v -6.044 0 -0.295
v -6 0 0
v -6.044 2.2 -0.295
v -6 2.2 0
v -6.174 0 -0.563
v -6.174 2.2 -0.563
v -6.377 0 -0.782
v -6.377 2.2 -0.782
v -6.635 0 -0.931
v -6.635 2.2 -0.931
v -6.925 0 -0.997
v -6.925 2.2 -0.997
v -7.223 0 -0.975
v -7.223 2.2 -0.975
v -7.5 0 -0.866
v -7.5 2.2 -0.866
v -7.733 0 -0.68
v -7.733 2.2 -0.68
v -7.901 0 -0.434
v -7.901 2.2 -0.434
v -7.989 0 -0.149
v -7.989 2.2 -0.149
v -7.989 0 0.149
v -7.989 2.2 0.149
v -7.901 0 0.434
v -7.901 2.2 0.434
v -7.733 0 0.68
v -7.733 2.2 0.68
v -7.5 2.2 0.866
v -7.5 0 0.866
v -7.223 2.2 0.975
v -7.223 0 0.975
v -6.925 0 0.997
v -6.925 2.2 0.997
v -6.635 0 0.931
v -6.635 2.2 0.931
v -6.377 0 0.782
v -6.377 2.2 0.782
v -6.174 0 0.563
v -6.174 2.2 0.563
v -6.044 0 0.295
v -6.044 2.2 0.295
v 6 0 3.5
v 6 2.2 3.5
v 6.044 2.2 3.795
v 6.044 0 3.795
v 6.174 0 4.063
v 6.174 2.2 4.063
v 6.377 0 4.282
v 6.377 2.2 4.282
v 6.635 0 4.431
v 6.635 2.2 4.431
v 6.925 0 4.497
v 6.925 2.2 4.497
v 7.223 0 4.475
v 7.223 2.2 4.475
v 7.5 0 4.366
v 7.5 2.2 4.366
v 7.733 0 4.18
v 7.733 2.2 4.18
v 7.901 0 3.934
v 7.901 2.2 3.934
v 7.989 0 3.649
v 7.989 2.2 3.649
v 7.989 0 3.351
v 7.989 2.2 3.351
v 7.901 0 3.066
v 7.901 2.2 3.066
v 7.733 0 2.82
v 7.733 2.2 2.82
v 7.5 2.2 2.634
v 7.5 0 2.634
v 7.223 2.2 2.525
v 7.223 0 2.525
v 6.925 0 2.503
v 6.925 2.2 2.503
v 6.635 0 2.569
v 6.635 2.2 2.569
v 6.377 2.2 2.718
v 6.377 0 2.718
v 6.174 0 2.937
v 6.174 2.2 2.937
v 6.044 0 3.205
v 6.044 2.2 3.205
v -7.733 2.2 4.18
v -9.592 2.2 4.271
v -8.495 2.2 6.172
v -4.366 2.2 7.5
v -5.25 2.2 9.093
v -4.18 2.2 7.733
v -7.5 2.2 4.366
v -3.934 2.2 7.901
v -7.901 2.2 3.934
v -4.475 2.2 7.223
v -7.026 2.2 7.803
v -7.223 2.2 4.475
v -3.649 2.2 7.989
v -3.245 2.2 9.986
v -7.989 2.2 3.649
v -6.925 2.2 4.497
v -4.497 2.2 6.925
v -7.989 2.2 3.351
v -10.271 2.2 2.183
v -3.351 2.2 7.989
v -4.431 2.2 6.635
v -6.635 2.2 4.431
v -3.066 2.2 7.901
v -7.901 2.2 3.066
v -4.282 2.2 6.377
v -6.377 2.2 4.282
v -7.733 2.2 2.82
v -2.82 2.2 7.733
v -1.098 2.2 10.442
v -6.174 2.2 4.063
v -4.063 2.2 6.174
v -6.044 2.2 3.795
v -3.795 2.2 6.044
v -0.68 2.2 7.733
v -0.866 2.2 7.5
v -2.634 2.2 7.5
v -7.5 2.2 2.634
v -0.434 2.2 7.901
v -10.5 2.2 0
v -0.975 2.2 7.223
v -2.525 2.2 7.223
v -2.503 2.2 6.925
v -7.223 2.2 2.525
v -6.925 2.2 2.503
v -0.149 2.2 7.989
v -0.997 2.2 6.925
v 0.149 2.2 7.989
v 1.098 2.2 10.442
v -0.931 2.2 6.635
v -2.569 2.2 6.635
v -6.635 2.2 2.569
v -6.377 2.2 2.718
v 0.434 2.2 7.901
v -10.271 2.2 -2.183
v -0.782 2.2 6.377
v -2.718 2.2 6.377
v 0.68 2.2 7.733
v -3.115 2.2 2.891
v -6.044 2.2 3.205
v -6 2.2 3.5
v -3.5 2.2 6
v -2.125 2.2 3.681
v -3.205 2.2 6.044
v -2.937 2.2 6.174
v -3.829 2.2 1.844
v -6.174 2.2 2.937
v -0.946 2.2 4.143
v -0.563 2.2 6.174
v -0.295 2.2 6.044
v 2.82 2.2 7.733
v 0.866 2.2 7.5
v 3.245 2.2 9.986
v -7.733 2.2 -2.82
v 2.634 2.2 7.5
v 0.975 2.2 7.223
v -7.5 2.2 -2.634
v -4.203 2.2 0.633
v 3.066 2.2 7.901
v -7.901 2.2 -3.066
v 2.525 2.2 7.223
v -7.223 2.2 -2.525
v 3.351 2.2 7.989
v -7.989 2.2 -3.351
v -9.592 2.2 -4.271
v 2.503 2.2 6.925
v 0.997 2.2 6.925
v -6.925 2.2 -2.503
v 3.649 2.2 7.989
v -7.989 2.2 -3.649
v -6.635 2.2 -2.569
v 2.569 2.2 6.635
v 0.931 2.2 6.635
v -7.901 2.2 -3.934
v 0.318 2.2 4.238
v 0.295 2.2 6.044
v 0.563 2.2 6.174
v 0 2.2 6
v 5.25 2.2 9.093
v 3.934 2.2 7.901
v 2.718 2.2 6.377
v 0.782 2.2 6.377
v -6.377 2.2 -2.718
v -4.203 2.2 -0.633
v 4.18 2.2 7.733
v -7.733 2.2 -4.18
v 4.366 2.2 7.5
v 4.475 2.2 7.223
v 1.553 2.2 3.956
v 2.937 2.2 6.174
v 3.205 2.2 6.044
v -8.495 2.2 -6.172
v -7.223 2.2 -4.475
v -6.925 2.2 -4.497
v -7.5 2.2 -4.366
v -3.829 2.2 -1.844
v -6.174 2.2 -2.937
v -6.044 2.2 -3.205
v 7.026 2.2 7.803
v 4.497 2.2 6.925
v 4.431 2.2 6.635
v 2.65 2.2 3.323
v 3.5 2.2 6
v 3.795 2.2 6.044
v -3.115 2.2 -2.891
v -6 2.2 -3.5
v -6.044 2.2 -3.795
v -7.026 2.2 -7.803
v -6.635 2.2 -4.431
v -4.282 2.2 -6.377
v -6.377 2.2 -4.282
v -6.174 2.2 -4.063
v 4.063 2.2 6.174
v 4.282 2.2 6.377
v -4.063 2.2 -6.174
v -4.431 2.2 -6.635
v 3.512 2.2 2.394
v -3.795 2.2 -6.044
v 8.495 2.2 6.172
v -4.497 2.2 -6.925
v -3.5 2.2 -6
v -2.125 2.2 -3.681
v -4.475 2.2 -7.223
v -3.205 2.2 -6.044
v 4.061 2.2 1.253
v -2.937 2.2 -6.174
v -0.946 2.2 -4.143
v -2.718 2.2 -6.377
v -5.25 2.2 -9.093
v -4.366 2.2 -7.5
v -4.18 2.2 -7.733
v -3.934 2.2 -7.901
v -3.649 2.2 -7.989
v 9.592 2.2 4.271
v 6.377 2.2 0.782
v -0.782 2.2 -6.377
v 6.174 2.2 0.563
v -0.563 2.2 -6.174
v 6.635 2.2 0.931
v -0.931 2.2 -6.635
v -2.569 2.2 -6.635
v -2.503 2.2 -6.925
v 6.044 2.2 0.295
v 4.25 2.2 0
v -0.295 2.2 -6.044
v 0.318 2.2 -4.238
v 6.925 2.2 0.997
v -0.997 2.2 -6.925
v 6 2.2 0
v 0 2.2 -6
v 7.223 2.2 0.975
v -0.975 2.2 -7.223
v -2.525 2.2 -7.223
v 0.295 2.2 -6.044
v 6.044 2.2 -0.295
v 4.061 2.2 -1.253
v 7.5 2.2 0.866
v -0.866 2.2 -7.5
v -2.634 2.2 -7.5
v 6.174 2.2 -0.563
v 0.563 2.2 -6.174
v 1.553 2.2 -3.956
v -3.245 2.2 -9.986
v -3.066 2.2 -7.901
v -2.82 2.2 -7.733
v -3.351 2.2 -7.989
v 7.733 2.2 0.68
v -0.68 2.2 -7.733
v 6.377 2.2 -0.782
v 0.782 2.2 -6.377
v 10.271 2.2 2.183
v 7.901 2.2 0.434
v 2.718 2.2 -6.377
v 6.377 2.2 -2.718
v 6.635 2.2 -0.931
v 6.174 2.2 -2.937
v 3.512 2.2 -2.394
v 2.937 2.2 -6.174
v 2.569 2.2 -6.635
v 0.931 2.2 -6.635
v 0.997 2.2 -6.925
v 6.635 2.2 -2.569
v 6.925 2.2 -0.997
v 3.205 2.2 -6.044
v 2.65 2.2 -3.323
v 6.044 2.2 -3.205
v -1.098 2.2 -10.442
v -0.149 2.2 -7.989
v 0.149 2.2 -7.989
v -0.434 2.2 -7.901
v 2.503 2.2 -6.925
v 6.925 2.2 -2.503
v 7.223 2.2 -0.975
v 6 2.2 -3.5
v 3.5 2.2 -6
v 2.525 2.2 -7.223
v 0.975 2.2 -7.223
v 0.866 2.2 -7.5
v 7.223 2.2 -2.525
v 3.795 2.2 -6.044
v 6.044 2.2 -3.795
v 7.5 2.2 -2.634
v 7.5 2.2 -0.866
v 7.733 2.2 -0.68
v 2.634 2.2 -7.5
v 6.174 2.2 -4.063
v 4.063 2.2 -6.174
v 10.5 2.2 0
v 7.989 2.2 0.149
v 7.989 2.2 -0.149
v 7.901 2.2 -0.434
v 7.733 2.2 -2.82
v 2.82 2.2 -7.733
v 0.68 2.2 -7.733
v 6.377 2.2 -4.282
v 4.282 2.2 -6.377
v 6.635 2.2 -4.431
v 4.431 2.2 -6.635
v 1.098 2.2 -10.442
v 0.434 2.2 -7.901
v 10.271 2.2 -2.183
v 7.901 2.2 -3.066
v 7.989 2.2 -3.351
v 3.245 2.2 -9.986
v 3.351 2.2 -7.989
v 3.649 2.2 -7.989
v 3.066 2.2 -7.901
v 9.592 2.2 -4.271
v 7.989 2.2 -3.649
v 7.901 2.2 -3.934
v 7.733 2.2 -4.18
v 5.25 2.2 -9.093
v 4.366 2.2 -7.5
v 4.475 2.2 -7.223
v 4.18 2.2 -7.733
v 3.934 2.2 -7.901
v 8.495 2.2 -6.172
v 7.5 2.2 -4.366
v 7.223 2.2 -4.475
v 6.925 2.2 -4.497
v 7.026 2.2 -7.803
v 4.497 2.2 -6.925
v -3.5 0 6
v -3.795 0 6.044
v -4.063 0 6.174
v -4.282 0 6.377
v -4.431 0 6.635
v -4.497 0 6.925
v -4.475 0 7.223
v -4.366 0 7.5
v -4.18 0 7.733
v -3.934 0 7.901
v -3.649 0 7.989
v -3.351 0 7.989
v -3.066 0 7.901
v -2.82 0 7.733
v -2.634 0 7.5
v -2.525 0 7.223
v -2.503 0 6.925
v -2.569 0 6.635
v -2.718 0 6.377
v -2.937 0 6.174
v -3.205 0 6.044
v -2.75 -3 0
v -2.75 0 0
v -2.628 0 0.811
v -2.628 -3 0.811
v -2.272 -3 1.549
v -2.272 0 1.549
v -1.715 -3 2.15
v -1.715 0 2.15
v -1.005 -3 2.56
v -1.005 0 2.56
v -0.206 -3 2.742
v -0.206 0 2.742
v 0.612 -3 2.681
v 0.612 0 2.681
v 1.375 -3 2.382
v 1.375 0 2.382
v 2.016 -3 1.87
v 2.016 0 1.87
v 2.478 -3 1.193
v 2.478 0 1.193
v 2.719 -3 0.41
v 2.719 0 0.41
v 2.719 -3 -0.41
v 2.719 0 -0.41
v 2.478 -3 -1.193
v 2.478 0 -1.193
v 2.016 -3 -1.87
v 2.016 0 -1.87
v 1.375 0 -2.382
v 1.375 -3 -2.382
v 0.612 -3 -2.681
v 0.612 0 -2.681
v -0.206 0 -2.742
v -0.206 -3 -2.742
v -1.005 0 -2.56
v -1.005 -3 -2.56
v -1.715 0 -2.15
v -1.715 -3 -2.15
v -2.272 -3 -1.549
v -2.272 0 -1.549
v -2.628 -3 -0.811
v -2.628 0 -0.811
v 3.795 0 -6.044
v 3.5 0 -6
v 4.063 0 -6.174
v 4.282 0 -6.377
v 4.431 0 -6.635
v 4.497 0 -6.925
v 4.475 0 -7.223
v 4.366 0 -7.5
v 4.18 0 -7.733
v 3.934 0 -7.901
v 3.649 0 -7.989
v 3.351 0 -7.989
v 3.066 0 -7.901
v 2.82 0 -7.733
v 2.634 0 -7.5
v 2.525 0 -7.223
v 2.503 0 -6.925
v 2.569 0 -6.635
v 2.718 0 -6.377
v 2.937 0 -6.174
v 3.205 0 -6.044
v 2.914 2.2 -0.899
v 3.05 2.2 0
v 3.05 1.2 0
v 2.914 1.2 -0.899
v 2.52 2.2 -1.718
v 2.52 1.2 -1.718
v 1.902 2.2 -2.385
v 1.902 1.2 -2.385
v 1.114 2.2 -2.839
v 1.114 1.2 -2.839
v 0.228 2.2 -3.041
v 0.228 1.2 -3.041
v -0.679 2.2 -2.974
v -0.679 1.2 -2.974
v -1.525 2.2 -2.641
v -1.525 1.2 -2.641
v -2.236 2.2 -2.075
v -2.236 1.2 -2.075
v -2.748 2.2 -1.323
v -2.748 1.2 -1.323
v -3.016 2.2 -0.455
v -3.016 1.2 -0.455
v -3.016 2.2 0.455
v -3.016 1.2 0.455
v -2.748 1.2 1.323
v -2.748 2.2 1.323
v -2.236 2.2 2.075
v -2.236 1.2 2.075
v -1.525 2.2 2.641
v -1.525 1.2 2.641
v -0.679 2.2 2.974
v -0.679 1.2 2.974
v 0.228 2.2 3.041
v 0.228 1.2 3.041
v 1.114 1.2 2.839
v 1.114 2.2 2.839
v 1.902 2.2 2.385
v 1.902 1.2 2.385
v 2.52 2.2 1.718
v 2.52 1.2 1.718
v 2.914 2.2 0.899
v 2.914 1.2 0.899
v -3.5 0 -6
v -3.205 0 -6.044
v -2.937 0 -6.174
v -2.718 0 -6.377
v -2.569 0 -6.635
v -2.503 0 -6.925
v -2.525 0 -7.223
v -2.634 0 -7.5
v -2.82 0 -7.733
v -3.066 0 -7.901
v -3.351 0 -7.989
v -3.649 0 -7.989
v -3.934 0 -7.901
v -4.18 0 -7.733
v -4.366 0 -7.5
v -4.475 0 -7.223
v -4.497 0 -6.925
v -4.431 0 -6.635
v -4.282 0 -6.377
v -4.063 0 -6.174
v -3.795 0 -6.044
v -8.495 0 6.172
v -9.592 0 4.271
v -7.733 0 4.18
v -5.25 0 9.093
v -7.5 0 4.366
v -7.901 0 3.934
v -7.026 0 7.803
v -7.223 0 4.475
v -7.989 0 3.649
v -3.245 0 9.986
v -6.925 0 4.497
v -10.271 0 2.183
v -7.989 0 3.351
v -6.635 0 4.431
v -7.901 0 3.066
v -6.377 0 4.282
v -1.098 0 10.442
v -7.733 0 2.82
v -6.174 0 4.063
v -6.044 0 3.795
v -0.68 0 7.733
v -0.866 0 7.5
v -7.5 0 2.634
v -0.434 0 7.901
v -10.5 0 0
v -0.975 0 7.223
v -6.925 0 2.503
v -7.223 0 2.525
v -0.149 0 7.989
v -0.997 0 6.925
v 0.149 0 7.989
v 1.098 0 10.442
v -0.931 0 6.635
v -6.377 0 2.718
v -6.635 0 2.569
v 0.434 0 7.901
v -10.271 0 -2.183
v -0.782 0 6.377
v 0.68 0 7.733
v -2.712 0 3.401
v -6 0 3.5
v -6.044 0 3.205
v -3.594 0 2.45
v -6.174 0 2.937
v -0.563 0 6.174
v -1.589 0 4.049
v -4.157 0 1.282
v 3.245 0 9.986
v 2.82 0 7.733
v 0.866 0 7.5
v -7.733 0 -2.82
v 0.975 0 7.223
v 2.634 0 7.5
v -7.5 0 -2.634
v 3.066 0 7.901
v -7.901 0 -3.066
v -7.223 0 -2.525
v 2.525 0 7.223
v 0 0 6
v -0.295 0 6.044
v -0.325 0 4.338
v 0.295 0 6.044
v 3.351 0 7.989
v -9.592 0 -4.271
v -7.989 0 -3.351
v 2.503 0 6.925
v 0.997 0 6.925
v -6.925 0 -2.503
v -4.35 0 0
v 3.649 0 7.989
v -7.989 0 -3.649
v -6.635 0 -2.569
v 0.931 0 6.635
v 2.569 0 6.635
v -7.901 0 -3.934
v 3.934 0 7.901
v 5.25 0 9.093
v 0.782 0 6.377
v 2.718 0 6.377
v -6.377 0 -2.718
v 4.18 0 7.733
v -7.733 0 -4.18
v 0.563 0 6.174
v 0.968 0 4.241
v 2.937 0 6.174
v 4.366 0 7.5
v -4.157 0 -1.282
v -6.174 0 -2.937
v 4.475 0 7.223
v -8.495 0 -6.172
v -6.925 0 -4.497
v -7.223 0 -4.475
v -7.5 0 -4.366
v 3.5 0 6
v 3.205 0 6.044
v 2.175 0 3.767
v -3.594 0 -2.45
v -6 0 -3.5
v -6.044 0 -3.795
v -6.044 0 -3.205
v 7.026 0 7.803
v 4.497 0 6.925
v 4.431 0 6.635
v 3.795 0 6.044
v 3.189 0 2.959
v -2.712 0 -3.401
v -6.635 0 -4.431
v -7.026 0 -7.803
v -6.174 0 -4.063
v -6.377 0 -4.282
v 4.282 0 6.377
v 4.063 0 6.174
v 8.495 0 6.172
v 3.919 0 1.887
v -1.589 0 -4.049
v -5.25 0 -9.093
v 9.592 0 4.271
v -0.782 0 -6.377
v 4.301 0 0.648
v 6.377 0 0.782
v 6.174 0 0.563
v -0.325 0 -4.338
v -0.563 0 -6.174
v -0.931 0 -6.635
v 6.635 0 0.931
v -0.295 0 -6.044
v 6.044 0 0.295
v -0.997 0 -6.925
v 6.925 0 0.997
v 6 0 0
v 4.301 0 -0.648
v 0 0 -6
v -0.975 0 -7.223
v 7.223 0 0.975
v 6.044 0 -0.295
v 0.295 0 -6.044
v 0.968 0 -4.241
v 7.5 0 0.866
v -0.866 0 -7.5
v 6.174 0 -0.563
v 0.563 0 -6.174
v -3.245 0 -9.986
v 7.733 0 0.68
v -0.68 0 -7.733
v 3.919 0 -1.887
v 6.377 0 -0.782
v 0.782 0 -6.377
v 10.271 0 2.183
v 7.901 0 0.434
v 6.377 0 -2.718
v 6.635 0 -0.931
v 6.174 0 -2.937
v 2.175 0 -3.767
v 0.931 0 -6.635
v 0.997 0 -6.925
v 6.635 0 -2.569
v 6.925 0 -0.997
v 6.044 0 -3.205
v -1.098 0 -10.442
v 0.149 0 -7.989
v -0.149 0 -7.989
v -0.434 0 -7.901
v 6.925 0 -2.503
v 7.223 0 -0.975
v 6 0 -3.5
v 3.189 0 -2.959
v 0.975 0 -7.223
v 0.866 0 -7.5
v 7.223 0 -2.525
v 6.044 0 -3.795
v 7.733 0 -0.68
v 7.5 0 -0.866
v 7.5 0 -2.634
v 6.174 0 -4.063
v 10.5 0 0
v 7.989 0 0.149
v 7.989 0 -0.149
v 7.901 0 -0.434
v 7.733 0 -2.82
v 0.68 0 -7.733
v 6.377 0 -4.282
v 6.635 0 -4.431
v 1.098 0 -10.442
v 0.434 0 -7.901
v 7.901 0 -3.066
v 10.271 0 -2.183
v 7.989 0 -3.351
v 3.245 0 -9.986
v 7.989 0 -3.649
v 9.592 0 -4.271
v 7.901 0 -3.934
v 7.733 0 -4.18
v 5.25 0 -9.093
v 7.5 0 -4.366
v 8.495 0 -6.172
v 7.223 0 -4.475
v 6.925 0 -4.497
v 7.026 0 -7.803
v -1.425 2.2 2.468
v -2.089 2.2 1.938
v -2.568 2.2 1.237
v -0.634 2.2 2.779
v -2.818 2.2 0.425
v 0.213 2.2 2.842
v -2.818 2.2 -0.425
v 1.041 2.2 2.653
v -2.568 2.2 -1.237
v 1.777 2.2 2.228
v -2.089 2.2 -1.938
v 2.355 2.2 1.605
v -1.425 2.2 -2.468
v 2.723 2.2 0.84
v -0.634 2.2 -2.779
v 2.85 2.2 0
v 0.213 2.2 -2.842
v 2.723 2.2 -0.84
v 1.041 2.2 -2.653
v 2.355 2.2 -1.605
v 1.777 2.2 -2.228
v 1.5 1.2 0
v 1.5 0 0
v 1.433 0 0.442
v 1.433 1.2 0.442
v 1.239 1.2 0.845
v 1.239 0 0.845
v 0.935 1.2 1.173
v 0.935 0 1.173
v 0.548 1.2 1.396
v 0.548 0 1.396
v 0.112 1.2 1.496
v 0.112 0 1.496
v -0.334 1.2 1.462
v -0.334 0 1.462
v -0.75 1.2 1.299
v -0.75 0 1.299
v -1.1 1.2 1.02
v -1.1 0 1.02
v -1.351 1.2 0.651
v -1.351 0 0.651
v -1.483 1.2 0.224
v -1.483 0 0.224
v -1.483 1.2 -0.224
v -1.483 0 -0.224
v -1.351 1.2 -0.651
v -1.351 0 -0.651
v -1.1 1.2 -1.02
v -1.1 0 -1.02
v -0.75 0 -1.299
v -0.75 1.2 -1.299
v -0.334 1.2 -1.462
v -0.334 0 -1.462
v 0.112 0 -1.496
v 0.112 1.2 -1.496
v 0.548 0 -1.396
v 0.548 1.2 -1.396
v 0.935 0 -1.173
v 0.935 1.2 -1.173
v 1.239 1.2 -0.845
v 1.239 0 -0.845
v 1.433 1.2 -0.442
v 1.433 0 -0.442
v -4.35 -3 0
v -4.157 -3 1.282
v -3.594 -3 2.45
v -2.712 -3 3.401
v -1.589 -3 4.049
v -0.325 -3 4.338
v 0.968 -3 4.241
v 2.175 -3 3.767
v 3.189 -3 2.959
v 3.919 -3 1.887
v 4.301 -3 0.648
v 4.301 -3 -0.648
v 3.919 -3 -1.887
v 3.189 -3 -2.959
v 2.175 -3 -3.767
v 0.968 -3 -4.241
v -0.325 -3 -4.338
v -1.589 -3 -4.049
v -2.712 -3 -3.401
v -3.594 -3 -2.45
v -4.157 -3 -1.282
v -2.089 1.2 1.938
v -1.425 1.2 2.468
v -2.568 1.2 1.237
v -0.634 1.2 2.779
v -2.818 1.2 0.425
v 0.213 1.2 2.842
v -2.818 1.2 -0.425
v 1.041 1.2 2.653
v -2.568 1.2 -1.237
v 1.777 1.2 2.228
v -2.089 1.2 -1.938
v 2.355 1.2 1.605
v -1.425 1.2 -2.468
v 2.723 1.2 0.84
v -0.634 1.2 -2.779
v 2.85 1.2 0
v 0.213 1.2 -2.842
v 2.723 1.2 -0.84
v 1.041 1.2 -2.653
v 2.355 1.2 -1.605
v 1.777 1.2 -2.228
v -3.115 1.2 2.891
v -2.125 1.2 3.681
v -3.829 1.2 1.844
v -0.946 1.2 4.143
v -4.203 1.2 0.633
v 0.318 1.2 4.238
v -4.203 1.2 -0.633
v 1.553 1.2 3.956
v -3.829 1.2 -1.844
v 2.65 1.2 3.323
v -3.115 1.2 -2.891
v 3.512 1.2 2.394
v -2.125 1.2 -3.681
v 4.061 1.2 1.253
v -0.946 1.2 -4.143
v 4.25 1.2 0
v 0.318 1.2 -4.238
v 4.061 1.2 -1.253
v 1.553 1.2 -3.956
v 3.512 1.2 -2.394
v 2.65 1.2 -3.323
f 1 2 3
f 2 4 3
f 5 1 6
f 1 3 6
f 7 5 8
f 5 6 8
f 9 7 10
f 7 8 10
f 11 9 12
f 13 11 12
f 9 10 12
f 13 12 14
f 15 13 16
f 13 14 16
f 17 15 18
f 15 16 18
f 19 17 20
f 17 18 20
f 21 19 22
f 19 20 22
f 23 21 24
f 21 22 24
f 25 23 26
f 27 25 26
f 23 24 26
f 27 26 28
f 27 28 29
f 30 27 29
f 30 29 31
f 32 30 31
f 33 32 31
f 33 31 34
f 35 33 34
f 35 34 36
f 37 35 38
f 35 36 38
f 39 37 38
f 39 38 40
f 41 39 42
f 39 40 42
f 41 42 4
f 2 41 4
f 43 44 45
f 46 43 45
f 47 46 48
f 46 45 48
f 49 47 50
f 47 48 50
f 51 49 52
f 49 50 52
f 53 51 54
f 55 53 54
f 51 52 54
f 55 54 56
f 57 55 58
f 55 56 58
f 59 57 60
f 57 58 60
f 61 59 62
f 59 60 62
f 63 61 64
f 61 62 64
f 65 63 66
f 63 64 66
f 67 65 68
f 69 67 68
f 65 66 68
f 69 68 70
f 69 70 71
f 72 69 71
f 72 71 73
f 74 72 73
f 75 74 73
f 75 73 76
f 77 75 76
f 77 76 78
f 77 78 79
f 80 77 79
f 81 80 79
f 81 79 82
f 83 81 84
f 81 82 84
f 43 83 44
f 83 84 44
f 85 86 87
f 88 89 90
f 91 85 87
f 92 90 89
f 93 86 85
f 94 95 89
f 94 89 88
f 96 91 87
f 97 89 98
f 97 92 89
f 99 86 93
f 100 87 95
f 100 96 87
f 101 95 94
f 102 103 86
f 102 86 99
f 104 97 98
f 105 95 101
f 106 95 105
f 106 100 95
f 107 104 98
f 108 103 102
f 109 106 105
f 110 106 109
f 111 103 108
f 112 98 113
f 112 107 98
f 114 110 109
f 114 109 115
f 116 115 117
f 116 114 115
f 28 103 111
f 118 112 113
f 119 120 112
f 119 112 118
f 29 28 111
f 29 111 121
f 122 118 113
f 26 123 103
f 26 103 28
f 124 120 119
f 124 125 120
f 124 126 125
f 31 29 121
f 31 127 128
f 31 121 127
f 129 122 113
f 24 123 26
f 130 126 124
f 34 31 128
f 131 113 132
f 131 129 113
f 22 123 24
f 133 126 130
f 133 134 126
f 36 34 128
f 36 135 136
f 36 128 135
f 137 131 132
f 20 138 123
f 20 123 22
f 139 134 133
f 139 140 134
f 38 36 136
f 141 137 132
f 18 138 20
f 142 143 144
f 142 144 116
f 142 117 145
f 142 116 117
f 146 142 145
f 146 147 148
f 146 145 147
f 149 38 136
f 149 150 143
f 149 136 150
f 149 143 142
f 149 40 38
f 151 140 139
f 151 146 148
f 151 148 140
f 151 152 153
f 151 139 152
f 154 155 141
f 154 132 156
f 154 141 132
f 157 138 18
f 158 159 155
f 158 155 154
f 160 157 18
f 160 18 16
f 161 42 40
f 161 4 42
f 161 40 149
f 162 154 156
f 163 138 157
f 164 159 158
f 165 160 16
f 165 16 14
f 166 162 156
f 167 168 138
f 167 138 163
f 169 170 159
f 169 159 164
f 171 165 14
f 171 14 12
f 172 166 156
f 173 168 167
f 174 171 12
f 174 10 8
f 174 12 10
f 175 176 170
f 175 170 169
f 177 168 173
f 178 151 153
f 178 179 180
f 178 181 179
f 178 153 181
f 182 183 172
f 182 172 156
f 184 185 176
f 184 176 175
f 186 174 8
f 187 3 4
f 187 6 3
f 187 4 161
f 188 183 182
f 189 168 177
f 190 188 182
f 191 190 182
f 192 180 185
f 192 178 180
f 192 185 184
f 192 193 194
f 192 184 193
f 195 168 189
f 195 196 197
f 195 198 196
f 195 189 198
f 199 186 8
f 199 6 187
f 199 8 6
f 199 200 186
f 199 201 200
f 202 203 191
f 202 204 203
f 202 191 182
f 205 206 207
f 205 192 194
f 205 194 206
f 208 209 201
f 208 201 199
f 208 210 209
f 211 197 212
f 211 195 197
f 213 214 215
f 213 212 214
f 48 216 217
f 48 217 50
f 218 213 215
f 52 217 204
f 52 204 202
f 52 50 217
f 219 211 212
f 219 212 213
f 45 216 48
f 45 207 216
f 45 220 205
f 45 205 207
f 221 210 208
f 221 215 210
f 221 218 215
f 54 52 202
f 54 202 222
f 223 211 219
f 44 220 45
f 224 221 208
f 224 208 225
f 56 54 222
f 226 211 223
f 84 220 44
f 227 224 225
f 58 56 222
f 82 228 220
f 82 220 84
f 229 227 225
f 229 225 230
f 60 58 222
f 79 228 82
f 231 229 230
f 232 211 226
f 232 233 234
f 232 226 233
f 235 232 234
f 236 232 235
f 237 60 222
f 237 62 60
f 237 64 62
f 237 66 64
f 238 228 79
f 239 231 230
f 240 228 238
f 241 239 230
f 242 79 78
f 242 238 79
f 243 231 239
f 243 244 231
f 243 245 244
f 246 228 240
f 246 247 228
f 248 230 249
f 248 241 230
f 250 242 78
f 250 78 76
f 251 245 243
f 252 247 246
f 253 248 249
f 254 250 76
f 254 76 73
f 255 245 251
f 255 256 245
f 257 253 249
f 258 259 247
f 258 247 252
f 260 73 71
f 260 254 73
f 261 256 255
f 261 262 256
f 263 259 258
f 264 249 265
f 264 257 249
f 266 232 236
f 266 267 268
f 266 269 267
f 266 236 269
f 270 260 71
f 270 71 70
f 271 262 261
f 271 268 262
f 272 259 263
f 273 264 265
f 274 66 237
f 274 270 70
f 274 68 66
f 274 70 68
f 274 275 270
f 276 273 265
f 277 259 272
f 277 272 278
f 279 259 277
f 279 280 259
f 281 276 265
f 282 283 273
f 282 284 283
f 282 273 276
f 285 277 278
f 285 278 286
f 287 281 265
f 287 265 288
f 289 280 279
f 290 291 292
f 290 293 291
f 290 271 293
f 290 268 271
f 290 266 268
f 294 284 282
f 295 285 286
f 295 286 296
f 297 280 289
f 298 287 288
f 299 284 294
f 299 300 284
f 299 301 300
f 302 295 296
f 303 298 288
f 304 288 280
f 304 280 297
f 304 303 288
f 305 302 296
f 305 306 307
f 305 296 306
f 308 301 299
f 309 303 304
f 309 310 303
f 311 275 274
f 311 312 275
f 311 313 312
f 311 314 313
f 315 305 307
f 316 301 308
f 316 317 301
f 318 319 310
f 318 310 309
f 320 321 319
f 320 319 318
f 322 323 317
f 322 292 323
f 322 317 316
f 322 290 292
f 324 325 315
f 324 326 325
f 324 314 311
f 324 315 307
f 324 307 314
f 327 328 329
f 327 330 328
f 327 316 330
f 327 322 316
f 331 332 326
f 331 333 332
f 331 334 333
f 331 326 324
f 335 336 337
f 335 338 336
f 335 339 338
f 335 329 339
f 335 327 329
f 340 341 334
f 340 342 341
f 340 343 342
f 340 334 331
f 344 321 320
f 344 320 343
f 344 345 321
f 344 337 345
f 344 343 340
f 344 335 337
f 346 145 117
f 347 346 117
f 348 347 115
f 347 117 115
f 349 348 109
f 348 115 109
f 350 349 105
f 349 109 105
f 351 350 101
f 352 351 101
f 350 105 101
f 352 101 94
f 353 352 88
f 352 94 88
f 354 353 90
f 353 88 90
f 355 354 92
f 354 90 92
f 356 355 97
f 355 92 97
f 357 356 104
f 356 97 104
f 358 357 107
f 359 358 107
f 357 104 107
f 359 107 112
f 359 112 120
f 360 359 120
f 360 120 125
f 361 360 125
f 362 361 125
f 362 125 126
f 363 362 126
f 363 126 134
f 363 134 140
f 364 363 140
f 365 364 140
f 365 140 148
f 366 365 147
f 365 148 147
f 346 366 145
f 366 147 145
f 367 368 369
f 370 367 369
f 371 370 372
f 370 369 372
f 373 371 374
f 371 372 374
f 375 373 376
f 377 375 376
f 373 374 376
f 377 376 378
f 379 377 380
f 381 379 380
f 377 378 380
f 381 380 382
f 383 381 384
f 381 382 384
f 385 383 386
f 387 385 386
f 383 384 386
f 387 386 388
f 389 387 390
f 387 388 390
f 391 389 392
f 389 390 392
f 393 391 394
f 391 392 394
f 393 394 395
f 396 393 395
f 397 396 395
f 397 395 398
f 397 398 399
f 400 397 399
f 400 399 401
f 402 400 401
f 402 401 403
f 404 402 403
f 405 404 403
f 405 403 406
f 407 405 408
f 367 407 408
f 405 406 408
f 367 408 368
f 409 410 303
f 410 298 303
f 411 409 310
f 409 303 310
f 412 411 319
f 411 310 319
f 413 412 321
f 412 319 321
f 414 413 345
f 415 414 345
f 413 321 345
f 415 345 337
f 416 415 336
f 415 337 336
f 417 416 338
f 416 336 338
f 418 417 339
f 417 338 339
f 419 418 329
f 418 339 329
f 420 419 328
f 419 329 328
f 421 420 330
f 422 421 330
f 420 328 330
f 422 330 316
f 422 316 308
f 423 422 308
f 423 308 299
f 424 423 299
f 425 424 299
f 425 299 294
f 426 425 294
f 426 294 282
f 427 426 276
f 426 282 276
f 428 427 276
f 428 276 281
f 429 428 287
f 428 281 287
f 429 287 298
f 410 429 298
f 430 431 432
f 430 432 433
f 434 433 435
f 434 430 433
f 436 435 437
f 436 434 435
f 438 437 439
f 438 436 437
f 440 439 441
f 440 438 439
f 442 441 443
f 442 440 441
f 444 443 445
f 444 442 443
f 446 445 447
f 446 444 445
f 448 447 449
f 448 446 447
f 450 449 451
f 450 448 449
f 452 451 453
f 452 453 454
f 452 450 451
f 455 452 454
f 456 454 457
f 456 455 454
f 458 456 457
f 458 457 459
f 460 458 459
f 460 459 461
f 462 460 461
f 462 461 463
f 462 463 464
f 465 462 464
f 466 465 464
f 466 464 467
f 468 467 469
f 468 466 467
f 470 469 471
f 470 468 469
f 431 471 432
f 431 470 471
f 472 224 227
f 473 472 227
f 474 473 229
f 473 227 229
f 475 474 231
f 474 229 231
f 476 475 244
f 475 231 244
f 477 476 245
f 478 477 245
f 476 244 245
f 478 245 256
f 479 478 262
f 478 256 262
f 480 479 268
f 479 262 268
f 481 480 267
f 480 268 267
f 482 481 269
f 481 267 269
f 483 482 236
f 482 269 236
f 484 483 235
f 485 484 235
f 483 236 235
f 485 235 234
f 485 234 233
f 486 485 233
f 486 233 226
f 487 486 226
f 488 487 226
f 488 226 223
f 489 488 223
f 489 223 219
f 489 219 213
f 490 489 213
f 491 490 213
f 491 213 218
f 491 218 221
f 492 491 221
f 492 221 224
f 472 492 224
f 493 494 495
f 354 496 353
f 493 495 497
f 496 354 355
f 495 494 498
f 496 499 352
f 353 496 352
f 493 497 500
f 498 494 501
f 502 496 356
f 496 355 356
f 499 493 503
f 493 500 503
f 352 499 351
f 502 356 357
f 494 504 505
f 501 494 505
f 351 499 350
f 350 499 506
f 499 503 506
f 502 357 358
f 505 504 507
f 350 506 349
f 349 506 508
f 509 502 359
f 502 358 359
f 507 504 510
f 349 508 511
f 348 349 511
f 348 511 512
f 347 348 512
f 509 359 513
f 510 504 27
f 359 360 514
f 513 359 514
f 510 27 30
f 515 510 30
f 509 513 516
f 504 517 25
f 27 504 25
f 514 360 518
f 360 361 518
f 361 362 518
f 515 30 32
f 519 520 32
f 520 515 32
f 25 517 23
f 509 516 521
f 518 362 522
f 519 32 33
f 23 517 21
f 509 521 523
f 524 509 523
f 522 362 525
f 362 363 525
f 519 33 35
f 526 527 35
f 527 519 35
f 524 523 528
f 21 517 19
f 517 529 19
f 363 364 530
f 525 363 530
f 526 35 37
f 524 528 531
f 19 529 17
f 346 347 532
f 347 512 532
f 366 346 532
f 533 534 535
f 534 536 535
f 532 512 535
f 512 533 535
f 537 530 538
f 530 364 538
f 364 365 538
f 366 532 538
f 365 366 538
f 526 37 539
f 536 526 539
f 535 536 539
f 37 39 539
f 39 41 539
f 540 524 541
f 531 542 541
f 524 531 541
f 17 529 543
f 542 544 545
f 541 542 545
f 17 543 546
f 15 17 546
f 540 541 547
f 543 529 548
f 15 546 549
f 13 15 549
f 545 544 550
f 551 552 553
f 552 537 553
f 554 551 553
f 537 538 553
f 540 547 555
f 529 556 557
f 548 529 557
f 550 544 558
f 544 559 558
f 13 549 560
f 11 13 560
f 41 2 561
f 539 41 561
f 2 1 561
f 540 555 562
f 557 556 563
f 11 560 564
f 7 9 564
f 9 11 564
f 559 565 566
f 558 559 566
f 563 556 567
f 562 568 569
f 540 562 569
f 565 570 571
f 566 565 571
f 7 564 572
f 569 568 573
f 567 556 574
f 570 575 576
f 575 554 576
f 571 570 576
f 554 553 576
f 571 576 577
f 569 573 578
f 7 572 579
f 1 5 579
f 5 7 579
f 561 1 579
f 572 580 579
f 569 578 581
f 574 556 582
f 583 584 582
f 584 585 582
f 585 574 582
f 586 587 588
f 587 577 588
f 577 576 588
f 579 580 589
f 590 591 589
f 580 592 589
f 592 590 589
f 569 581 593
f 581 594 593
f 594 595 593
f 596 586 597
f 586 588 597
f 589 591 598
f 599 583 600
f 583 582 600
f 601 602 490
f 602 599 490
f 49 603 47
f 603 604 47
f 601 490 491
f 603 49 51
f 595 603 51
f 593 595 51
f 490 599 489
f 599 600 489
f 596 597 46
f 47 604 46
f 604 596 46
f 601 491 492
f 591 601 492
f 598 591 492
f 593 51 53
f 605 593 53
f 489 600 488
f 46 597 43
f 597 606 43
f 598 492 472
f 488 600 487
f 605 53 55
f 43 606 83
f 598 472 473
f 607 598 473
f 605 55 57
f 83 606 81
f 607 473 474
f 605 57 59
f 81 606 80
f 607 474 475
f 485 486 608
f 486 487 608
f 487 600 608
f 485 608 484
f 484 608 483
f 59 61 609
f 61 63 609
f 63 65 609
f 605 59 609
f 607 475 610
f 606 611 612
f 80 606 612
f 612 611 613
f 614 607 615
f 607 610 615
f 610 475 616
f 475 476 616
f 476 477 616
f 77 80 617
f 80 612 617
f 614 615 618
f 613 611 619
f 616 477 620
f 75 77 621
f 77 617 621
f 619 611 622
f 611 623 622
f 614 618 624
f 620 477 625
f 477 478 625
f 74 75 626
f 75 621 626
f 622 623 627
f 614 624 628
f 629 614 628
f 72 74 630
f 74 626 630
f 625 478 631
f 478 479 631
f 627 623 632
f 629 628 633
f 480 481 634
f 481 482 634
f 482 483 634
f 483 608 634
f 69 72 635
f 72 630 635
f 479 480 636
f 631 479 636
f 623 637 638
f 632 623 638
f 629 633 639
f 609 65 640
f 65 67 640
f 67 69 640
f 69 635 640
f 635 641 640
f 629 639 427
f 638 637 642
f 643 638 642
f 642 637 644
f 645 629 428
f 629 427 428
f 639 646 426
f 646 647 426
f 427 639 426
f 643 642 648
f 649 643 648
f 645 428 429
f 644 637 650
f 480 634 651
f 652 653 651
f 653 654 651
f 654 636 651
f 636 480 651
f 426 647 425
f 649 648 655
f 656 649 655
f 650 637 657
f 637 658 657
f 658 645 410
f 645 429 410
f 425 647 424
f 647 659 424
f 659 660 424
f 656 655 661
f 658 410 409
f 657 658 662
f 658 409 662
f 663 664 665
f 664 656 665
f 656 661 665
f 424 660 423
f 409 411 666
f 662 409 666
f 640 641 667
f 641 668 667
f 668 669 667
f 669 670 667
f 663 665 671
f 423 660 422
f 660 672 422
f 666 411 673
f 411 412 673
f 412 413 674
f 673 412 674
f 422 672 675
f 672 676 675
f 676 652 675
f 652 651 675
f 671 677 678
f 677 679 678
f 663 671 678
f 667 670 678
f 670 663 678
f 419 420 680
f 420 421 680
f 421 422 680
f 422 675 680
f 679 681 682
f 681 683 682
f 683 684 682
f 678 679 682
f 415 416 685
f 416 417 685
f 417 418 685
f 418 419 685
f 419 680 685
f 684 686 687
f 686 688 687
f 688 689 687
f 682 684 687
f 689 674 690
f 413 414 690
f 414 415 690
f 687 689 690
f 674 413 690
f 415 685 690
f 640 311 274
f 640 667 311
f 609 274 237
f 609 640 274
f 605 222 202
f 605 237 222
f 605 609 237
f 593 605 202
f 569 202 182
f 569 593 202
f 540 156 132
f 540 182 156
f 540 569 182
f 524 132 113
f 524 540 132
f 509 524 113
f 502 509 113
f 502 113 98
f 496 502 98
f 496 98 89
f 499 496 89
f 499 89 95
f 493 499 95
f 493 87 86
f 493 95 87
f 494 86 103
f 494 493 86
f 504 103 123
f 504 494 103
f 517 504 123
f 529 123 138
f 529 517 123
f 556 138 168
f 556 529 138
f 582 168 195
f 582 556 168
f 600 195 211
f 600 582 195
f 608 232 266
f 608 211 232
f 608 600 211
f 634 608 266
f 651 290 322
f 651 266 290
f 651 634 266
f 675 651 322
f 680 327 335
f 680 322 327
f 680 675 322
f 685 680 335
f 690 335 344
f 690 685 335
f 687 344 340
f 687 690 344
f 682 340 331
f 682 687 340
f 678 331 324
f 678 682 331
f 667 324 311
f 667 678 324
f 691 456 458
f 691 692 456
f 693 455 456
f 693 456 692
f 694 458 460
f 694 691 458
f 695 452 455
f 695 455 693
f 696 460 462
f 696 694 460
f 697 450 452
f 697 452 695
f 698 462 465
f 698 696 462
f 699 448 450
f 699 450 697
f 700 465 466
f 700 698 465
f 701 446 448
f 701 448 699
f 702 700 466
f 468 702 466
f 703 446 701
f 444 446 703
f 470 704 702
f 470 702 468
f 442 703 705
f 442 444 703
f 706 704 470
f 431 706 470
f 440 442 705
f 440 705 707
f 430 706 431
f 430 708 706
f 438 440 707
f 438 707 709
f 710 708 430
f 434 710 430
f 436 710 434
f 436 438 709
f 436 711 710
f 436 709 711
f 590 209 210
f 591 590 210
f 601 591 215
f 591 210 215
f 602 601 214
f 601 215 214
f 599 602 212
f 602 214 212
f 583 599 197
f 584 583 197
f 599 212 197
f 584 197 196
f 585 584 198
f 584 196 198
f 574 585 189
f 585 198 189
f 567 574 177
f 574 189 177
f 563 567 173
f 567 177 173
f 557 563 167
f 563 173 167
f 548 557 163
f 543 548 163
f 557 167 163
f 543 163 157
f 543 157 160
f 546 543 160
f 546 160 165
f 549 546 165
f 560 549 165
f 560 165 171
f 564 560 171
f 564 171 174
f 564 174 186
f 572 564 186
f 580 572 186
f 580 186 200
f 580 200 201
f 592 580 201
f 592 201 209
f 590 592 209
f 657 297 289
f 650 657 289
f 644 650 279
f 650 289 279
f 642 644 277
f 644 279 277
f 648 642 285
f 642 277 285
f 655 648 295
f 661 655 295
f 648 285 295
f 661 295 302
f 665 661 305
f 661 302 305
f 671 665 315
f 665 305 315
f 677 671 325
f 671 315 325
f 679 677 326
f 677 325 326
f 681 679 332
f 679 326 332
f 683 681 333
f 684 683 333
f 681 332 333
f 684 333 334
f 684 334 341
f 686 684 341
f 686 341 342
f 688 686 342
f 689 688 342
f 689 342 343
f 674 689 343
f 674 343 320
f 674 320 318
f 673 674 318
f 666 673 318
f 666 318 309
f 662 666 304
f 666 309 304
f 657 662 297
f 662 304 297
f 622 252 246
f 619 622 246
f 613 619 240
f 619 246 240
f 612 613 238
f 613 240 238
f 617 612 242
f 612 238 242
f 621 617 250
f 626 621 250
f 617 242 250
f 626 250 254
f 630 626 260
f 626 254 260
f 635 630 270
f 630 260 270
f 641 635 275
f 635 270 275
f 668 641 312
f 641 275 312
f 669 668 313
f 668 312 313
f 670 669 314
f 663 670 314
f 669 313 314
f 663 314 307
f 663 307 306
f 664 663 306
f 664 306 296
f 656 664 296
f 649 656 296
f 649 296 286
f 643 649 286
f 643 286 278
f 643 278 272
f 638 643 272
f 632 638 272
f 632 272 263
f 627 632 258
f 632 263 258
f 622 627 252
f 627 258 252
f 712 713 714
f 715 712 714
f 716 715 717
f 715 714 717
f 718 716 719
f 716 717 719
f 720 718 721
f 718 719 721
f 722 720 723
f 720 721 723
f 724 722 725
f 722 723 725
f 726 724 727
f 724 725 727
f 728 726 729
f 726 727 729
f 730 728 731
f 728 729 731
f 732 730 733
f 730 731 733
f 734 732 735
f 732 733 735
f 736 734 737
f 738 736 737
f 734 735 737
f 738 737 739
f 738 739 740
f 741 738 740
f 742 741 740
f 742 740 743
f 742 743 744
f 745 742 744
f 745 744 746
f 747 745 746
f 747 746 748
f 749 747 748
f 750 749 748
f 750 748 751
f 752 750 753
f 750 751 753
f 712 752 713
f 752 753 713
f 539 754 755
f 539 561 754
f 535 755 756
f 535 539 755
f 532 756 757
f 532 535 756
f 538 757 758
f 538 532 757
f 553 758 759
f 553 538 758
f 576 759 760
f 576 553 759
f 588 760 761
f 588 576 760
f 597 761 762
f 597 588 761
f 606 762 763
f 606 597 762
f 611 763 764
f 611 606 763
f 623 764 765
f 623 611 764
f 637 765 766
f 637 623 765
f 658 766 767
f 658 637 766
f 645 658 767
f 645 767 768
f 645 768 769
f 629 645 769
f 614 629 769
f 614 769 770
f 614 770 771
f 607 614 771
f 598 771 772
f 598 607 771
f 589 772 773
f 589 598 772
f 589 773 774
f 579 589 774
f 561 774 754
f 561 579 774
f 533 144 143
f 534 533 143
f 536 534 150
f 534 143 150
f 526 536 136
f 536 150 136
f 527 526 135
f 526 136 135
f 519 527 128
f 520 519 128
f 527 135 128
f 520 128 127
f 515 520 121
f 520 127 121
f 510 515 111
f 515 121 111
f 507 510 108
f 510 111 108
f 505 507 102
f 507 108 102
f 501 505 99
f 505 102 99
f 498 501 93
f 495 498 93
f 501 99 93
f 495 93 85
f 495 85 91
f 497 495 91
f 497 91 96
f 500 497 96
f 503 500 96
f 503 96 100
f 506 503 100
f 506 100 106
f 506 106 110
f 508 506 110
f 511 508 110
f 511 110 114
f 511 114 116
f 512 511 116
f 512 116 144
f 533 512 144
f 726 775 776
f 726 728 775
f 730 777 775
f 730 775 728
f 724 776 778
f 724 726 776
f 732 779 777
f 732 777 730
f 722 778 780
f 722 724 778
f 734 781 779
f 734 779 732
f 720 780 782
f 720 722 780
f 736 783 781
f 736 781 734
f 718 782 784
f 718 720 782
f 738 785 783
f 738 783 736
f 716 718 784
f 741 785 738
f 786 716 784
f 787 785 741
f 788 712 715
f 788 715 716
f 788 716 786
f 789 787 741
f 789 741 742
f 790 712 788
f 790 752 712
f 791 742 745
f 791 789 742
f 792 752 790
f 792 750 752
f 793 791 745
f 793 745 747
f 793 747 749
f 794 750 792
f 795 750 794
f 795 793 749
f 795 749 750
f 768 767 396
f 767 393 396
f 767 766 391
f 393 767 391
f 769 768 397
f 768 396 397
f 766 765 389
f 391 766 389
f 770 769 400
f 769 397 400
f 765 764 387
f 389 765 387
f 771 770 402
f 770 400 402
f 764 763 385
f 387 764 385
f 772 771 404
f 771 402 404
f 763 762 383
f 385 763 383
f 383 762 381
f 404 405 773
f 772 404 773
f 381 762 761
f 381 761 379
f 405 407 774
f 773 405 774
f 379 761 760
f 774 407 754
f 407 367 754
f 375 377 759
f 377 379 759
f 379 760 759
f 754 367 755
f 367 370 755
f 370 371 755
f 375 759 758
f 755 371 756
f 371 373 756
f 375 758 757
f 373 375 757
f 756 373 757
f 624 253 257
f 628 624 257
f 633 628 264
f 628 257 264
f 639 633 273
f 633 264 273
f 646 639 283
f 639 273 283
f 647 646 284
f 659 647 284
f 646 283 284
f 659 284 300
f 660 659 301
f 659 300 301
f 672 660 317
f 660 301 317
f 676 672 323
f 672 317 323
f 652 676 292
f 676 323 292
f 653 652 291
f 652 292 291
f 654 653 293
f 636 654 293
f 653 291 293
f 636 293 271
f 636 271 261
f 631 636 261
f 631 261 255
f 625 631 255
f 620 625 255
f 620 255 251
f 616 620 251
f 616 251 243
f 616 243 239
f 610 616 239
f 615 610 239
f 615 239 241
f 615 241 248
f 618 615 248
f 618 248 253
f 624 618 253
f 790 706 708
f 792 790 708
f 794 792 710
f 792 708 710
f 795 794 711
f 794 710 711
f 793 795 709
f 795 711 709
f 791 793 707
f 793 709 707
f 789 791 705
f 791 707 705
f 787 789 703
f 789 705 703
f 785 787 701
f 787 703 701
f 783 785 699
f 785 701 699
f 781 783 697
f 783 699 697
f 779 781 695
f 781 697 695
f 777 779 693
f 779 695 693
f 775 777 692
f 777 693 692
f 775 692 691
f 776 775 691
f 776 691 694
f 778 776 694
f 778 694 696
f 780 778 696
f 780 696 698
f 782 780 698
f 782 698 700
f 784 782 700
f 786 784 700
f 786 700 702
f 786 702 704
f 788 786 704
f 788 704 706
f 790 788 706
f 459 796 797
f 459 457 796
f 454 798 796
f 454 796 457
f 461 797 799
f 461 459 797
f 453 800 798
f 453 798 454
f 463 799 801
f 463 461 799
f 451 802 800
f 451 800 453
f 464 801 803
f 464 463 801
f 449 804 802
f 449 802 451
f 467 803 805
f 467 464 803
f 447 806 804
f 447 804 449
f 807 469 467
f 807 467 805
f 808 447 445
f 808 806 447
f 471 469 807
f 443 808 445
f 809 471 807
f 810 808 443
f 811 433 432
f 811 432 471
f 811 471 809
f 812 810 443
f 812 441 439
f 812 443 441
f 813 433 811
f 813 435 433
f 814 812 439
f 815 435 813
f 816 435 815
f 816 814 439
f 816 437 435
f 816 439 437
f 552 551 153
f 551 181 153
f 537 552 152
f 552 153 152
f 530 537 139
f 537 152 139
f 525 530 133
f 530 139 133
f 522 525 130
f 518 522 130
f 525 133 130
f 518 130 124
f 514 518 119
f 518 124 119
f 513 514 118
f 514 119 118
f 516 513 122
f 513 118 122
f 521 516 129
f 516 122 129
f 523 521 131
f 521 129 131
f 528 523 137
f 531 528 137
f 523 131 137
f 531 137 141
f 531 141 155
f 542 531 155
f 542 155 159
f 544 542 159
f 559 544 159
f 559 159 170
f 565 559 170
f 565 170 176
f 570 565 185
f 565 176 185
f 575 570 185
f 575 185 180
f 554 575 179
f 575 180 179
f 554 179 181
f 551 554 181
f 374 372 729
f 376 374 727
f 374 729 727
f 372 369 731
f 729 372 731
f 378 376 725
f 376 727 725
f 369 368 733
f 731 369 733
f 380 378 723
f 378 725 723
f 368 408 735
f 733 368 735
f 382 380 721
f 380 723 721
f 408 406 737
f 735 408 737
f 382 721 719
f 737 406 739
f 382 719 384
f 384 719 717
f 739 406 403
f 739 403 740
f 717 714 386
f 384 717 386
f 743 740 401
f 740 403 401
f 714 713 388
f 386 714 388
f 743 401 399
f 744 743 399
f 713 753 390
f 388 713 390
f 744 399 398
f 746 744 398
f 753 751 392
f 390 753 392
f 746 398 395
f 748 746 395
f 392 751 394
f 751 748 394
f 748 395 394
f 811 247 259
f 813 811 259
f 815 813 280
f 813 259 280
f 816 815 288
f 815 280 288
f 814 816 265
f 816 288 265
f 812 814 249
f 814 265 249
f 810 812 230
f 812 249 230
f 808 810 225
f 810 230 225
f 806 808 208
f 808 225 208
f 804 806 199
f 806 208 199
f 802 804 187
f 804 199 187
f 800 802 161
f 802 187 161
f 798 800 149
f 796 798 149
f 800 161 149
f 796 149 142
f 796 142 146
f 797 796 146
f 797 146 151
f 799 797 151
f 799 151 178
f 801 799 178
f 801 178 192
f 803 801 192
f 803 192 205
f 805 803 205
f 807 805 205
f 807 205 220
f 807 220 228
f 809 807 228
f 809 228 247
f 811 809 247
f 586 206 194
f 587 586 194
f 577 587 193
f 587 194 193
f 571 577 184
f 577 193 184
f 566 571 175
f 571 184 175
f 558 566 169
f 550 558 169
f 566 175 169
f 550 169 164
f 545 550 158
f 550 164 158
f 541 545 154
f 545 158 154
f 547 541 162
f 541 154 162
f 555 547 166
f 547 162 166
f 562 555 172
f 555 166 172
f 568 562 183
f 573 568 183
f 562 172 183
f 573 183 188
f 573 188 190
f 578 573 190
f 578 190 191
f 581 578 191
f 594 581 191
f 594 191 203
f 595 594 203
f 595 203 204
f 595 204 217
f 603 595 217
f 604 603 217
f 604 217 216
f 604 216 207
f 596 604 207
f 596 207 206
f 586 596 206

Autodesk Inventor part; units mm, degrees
ref_plane "YZ Plane" through (0, 0, 0) normal (1, 0, 0) x (0, 1, 0)
ref_plane "XZ Plane" through (0, 0, 0) normal (0, 1, 0) x (-1, 0, 0)
ref_plane "XY Plane" through (0, 0, 0) normal (0, 0, 1) x (1, 0, 0)
sketch "스케치1" plane through (0, 0, 0) normal (0, 1, 0) x (-1, 0, 0)
  circle A0 centre (0, 0) radius 4.35
  circle A1 centre (0, 0) radius 2.75
  dimension "d0" = 8.7
  dimension "d1" = 5.5
extrude "돌출1" add sketch "스케치1" against normal blind 3
sketch "스케치3" plane through (0, 0, 0) normal (0, 1, 0) x (1, 0, 0)
  circle A0 centre (0, 0) radius 10.5
  circle A1 centre (0, 0) radius 1.5
  dimension "d4" = 21
  dimension "d5" = 3
extrude "돌출2" add sketch "스케치3" along normal blind 2.2
sketch "스케치4" plane through (0, 2.2, 0) normal (0, 1, 0) x (1, 0, 0)
  circle A0 centre (0, 0) radius 2.85
  circle A1 centre (0, 0) radius 3.05
  circle A2 centre (0, 0) radius 4.25
  dimension "d8" = 5.7
  dimension "d9" = 6.1
  dimension "d10" = 8.5
extrude "돌출3" cut sketch "스케치4" against normal blind 1
sketch "스케치5" plane through (0, 2.2, 0) normal (0, 1, 0) x (1, 0, 0)
  circle A0 centre (-7, 0) radius 1
  circle A1 centre (-7, -3.5) radius 1
  line L0 (0, 0) -> (-0.944, 0)
  circle A2 centre (-7, 3.5) radius 1
  dimension "d13" = 2
  dimension "d14" = 7
  dimension "d15" = 2
  dimension "d16" = 3.5
extrude "돌출4" cut sketch "스케치5" against normal blind 7.25
pattern_circular "원형 패턴1" count 4 over 360 about axis through (0, 2.2, 0) along (0, -1, 0) of "돌출4"
properties part number "MG서보모터 원형부품"
